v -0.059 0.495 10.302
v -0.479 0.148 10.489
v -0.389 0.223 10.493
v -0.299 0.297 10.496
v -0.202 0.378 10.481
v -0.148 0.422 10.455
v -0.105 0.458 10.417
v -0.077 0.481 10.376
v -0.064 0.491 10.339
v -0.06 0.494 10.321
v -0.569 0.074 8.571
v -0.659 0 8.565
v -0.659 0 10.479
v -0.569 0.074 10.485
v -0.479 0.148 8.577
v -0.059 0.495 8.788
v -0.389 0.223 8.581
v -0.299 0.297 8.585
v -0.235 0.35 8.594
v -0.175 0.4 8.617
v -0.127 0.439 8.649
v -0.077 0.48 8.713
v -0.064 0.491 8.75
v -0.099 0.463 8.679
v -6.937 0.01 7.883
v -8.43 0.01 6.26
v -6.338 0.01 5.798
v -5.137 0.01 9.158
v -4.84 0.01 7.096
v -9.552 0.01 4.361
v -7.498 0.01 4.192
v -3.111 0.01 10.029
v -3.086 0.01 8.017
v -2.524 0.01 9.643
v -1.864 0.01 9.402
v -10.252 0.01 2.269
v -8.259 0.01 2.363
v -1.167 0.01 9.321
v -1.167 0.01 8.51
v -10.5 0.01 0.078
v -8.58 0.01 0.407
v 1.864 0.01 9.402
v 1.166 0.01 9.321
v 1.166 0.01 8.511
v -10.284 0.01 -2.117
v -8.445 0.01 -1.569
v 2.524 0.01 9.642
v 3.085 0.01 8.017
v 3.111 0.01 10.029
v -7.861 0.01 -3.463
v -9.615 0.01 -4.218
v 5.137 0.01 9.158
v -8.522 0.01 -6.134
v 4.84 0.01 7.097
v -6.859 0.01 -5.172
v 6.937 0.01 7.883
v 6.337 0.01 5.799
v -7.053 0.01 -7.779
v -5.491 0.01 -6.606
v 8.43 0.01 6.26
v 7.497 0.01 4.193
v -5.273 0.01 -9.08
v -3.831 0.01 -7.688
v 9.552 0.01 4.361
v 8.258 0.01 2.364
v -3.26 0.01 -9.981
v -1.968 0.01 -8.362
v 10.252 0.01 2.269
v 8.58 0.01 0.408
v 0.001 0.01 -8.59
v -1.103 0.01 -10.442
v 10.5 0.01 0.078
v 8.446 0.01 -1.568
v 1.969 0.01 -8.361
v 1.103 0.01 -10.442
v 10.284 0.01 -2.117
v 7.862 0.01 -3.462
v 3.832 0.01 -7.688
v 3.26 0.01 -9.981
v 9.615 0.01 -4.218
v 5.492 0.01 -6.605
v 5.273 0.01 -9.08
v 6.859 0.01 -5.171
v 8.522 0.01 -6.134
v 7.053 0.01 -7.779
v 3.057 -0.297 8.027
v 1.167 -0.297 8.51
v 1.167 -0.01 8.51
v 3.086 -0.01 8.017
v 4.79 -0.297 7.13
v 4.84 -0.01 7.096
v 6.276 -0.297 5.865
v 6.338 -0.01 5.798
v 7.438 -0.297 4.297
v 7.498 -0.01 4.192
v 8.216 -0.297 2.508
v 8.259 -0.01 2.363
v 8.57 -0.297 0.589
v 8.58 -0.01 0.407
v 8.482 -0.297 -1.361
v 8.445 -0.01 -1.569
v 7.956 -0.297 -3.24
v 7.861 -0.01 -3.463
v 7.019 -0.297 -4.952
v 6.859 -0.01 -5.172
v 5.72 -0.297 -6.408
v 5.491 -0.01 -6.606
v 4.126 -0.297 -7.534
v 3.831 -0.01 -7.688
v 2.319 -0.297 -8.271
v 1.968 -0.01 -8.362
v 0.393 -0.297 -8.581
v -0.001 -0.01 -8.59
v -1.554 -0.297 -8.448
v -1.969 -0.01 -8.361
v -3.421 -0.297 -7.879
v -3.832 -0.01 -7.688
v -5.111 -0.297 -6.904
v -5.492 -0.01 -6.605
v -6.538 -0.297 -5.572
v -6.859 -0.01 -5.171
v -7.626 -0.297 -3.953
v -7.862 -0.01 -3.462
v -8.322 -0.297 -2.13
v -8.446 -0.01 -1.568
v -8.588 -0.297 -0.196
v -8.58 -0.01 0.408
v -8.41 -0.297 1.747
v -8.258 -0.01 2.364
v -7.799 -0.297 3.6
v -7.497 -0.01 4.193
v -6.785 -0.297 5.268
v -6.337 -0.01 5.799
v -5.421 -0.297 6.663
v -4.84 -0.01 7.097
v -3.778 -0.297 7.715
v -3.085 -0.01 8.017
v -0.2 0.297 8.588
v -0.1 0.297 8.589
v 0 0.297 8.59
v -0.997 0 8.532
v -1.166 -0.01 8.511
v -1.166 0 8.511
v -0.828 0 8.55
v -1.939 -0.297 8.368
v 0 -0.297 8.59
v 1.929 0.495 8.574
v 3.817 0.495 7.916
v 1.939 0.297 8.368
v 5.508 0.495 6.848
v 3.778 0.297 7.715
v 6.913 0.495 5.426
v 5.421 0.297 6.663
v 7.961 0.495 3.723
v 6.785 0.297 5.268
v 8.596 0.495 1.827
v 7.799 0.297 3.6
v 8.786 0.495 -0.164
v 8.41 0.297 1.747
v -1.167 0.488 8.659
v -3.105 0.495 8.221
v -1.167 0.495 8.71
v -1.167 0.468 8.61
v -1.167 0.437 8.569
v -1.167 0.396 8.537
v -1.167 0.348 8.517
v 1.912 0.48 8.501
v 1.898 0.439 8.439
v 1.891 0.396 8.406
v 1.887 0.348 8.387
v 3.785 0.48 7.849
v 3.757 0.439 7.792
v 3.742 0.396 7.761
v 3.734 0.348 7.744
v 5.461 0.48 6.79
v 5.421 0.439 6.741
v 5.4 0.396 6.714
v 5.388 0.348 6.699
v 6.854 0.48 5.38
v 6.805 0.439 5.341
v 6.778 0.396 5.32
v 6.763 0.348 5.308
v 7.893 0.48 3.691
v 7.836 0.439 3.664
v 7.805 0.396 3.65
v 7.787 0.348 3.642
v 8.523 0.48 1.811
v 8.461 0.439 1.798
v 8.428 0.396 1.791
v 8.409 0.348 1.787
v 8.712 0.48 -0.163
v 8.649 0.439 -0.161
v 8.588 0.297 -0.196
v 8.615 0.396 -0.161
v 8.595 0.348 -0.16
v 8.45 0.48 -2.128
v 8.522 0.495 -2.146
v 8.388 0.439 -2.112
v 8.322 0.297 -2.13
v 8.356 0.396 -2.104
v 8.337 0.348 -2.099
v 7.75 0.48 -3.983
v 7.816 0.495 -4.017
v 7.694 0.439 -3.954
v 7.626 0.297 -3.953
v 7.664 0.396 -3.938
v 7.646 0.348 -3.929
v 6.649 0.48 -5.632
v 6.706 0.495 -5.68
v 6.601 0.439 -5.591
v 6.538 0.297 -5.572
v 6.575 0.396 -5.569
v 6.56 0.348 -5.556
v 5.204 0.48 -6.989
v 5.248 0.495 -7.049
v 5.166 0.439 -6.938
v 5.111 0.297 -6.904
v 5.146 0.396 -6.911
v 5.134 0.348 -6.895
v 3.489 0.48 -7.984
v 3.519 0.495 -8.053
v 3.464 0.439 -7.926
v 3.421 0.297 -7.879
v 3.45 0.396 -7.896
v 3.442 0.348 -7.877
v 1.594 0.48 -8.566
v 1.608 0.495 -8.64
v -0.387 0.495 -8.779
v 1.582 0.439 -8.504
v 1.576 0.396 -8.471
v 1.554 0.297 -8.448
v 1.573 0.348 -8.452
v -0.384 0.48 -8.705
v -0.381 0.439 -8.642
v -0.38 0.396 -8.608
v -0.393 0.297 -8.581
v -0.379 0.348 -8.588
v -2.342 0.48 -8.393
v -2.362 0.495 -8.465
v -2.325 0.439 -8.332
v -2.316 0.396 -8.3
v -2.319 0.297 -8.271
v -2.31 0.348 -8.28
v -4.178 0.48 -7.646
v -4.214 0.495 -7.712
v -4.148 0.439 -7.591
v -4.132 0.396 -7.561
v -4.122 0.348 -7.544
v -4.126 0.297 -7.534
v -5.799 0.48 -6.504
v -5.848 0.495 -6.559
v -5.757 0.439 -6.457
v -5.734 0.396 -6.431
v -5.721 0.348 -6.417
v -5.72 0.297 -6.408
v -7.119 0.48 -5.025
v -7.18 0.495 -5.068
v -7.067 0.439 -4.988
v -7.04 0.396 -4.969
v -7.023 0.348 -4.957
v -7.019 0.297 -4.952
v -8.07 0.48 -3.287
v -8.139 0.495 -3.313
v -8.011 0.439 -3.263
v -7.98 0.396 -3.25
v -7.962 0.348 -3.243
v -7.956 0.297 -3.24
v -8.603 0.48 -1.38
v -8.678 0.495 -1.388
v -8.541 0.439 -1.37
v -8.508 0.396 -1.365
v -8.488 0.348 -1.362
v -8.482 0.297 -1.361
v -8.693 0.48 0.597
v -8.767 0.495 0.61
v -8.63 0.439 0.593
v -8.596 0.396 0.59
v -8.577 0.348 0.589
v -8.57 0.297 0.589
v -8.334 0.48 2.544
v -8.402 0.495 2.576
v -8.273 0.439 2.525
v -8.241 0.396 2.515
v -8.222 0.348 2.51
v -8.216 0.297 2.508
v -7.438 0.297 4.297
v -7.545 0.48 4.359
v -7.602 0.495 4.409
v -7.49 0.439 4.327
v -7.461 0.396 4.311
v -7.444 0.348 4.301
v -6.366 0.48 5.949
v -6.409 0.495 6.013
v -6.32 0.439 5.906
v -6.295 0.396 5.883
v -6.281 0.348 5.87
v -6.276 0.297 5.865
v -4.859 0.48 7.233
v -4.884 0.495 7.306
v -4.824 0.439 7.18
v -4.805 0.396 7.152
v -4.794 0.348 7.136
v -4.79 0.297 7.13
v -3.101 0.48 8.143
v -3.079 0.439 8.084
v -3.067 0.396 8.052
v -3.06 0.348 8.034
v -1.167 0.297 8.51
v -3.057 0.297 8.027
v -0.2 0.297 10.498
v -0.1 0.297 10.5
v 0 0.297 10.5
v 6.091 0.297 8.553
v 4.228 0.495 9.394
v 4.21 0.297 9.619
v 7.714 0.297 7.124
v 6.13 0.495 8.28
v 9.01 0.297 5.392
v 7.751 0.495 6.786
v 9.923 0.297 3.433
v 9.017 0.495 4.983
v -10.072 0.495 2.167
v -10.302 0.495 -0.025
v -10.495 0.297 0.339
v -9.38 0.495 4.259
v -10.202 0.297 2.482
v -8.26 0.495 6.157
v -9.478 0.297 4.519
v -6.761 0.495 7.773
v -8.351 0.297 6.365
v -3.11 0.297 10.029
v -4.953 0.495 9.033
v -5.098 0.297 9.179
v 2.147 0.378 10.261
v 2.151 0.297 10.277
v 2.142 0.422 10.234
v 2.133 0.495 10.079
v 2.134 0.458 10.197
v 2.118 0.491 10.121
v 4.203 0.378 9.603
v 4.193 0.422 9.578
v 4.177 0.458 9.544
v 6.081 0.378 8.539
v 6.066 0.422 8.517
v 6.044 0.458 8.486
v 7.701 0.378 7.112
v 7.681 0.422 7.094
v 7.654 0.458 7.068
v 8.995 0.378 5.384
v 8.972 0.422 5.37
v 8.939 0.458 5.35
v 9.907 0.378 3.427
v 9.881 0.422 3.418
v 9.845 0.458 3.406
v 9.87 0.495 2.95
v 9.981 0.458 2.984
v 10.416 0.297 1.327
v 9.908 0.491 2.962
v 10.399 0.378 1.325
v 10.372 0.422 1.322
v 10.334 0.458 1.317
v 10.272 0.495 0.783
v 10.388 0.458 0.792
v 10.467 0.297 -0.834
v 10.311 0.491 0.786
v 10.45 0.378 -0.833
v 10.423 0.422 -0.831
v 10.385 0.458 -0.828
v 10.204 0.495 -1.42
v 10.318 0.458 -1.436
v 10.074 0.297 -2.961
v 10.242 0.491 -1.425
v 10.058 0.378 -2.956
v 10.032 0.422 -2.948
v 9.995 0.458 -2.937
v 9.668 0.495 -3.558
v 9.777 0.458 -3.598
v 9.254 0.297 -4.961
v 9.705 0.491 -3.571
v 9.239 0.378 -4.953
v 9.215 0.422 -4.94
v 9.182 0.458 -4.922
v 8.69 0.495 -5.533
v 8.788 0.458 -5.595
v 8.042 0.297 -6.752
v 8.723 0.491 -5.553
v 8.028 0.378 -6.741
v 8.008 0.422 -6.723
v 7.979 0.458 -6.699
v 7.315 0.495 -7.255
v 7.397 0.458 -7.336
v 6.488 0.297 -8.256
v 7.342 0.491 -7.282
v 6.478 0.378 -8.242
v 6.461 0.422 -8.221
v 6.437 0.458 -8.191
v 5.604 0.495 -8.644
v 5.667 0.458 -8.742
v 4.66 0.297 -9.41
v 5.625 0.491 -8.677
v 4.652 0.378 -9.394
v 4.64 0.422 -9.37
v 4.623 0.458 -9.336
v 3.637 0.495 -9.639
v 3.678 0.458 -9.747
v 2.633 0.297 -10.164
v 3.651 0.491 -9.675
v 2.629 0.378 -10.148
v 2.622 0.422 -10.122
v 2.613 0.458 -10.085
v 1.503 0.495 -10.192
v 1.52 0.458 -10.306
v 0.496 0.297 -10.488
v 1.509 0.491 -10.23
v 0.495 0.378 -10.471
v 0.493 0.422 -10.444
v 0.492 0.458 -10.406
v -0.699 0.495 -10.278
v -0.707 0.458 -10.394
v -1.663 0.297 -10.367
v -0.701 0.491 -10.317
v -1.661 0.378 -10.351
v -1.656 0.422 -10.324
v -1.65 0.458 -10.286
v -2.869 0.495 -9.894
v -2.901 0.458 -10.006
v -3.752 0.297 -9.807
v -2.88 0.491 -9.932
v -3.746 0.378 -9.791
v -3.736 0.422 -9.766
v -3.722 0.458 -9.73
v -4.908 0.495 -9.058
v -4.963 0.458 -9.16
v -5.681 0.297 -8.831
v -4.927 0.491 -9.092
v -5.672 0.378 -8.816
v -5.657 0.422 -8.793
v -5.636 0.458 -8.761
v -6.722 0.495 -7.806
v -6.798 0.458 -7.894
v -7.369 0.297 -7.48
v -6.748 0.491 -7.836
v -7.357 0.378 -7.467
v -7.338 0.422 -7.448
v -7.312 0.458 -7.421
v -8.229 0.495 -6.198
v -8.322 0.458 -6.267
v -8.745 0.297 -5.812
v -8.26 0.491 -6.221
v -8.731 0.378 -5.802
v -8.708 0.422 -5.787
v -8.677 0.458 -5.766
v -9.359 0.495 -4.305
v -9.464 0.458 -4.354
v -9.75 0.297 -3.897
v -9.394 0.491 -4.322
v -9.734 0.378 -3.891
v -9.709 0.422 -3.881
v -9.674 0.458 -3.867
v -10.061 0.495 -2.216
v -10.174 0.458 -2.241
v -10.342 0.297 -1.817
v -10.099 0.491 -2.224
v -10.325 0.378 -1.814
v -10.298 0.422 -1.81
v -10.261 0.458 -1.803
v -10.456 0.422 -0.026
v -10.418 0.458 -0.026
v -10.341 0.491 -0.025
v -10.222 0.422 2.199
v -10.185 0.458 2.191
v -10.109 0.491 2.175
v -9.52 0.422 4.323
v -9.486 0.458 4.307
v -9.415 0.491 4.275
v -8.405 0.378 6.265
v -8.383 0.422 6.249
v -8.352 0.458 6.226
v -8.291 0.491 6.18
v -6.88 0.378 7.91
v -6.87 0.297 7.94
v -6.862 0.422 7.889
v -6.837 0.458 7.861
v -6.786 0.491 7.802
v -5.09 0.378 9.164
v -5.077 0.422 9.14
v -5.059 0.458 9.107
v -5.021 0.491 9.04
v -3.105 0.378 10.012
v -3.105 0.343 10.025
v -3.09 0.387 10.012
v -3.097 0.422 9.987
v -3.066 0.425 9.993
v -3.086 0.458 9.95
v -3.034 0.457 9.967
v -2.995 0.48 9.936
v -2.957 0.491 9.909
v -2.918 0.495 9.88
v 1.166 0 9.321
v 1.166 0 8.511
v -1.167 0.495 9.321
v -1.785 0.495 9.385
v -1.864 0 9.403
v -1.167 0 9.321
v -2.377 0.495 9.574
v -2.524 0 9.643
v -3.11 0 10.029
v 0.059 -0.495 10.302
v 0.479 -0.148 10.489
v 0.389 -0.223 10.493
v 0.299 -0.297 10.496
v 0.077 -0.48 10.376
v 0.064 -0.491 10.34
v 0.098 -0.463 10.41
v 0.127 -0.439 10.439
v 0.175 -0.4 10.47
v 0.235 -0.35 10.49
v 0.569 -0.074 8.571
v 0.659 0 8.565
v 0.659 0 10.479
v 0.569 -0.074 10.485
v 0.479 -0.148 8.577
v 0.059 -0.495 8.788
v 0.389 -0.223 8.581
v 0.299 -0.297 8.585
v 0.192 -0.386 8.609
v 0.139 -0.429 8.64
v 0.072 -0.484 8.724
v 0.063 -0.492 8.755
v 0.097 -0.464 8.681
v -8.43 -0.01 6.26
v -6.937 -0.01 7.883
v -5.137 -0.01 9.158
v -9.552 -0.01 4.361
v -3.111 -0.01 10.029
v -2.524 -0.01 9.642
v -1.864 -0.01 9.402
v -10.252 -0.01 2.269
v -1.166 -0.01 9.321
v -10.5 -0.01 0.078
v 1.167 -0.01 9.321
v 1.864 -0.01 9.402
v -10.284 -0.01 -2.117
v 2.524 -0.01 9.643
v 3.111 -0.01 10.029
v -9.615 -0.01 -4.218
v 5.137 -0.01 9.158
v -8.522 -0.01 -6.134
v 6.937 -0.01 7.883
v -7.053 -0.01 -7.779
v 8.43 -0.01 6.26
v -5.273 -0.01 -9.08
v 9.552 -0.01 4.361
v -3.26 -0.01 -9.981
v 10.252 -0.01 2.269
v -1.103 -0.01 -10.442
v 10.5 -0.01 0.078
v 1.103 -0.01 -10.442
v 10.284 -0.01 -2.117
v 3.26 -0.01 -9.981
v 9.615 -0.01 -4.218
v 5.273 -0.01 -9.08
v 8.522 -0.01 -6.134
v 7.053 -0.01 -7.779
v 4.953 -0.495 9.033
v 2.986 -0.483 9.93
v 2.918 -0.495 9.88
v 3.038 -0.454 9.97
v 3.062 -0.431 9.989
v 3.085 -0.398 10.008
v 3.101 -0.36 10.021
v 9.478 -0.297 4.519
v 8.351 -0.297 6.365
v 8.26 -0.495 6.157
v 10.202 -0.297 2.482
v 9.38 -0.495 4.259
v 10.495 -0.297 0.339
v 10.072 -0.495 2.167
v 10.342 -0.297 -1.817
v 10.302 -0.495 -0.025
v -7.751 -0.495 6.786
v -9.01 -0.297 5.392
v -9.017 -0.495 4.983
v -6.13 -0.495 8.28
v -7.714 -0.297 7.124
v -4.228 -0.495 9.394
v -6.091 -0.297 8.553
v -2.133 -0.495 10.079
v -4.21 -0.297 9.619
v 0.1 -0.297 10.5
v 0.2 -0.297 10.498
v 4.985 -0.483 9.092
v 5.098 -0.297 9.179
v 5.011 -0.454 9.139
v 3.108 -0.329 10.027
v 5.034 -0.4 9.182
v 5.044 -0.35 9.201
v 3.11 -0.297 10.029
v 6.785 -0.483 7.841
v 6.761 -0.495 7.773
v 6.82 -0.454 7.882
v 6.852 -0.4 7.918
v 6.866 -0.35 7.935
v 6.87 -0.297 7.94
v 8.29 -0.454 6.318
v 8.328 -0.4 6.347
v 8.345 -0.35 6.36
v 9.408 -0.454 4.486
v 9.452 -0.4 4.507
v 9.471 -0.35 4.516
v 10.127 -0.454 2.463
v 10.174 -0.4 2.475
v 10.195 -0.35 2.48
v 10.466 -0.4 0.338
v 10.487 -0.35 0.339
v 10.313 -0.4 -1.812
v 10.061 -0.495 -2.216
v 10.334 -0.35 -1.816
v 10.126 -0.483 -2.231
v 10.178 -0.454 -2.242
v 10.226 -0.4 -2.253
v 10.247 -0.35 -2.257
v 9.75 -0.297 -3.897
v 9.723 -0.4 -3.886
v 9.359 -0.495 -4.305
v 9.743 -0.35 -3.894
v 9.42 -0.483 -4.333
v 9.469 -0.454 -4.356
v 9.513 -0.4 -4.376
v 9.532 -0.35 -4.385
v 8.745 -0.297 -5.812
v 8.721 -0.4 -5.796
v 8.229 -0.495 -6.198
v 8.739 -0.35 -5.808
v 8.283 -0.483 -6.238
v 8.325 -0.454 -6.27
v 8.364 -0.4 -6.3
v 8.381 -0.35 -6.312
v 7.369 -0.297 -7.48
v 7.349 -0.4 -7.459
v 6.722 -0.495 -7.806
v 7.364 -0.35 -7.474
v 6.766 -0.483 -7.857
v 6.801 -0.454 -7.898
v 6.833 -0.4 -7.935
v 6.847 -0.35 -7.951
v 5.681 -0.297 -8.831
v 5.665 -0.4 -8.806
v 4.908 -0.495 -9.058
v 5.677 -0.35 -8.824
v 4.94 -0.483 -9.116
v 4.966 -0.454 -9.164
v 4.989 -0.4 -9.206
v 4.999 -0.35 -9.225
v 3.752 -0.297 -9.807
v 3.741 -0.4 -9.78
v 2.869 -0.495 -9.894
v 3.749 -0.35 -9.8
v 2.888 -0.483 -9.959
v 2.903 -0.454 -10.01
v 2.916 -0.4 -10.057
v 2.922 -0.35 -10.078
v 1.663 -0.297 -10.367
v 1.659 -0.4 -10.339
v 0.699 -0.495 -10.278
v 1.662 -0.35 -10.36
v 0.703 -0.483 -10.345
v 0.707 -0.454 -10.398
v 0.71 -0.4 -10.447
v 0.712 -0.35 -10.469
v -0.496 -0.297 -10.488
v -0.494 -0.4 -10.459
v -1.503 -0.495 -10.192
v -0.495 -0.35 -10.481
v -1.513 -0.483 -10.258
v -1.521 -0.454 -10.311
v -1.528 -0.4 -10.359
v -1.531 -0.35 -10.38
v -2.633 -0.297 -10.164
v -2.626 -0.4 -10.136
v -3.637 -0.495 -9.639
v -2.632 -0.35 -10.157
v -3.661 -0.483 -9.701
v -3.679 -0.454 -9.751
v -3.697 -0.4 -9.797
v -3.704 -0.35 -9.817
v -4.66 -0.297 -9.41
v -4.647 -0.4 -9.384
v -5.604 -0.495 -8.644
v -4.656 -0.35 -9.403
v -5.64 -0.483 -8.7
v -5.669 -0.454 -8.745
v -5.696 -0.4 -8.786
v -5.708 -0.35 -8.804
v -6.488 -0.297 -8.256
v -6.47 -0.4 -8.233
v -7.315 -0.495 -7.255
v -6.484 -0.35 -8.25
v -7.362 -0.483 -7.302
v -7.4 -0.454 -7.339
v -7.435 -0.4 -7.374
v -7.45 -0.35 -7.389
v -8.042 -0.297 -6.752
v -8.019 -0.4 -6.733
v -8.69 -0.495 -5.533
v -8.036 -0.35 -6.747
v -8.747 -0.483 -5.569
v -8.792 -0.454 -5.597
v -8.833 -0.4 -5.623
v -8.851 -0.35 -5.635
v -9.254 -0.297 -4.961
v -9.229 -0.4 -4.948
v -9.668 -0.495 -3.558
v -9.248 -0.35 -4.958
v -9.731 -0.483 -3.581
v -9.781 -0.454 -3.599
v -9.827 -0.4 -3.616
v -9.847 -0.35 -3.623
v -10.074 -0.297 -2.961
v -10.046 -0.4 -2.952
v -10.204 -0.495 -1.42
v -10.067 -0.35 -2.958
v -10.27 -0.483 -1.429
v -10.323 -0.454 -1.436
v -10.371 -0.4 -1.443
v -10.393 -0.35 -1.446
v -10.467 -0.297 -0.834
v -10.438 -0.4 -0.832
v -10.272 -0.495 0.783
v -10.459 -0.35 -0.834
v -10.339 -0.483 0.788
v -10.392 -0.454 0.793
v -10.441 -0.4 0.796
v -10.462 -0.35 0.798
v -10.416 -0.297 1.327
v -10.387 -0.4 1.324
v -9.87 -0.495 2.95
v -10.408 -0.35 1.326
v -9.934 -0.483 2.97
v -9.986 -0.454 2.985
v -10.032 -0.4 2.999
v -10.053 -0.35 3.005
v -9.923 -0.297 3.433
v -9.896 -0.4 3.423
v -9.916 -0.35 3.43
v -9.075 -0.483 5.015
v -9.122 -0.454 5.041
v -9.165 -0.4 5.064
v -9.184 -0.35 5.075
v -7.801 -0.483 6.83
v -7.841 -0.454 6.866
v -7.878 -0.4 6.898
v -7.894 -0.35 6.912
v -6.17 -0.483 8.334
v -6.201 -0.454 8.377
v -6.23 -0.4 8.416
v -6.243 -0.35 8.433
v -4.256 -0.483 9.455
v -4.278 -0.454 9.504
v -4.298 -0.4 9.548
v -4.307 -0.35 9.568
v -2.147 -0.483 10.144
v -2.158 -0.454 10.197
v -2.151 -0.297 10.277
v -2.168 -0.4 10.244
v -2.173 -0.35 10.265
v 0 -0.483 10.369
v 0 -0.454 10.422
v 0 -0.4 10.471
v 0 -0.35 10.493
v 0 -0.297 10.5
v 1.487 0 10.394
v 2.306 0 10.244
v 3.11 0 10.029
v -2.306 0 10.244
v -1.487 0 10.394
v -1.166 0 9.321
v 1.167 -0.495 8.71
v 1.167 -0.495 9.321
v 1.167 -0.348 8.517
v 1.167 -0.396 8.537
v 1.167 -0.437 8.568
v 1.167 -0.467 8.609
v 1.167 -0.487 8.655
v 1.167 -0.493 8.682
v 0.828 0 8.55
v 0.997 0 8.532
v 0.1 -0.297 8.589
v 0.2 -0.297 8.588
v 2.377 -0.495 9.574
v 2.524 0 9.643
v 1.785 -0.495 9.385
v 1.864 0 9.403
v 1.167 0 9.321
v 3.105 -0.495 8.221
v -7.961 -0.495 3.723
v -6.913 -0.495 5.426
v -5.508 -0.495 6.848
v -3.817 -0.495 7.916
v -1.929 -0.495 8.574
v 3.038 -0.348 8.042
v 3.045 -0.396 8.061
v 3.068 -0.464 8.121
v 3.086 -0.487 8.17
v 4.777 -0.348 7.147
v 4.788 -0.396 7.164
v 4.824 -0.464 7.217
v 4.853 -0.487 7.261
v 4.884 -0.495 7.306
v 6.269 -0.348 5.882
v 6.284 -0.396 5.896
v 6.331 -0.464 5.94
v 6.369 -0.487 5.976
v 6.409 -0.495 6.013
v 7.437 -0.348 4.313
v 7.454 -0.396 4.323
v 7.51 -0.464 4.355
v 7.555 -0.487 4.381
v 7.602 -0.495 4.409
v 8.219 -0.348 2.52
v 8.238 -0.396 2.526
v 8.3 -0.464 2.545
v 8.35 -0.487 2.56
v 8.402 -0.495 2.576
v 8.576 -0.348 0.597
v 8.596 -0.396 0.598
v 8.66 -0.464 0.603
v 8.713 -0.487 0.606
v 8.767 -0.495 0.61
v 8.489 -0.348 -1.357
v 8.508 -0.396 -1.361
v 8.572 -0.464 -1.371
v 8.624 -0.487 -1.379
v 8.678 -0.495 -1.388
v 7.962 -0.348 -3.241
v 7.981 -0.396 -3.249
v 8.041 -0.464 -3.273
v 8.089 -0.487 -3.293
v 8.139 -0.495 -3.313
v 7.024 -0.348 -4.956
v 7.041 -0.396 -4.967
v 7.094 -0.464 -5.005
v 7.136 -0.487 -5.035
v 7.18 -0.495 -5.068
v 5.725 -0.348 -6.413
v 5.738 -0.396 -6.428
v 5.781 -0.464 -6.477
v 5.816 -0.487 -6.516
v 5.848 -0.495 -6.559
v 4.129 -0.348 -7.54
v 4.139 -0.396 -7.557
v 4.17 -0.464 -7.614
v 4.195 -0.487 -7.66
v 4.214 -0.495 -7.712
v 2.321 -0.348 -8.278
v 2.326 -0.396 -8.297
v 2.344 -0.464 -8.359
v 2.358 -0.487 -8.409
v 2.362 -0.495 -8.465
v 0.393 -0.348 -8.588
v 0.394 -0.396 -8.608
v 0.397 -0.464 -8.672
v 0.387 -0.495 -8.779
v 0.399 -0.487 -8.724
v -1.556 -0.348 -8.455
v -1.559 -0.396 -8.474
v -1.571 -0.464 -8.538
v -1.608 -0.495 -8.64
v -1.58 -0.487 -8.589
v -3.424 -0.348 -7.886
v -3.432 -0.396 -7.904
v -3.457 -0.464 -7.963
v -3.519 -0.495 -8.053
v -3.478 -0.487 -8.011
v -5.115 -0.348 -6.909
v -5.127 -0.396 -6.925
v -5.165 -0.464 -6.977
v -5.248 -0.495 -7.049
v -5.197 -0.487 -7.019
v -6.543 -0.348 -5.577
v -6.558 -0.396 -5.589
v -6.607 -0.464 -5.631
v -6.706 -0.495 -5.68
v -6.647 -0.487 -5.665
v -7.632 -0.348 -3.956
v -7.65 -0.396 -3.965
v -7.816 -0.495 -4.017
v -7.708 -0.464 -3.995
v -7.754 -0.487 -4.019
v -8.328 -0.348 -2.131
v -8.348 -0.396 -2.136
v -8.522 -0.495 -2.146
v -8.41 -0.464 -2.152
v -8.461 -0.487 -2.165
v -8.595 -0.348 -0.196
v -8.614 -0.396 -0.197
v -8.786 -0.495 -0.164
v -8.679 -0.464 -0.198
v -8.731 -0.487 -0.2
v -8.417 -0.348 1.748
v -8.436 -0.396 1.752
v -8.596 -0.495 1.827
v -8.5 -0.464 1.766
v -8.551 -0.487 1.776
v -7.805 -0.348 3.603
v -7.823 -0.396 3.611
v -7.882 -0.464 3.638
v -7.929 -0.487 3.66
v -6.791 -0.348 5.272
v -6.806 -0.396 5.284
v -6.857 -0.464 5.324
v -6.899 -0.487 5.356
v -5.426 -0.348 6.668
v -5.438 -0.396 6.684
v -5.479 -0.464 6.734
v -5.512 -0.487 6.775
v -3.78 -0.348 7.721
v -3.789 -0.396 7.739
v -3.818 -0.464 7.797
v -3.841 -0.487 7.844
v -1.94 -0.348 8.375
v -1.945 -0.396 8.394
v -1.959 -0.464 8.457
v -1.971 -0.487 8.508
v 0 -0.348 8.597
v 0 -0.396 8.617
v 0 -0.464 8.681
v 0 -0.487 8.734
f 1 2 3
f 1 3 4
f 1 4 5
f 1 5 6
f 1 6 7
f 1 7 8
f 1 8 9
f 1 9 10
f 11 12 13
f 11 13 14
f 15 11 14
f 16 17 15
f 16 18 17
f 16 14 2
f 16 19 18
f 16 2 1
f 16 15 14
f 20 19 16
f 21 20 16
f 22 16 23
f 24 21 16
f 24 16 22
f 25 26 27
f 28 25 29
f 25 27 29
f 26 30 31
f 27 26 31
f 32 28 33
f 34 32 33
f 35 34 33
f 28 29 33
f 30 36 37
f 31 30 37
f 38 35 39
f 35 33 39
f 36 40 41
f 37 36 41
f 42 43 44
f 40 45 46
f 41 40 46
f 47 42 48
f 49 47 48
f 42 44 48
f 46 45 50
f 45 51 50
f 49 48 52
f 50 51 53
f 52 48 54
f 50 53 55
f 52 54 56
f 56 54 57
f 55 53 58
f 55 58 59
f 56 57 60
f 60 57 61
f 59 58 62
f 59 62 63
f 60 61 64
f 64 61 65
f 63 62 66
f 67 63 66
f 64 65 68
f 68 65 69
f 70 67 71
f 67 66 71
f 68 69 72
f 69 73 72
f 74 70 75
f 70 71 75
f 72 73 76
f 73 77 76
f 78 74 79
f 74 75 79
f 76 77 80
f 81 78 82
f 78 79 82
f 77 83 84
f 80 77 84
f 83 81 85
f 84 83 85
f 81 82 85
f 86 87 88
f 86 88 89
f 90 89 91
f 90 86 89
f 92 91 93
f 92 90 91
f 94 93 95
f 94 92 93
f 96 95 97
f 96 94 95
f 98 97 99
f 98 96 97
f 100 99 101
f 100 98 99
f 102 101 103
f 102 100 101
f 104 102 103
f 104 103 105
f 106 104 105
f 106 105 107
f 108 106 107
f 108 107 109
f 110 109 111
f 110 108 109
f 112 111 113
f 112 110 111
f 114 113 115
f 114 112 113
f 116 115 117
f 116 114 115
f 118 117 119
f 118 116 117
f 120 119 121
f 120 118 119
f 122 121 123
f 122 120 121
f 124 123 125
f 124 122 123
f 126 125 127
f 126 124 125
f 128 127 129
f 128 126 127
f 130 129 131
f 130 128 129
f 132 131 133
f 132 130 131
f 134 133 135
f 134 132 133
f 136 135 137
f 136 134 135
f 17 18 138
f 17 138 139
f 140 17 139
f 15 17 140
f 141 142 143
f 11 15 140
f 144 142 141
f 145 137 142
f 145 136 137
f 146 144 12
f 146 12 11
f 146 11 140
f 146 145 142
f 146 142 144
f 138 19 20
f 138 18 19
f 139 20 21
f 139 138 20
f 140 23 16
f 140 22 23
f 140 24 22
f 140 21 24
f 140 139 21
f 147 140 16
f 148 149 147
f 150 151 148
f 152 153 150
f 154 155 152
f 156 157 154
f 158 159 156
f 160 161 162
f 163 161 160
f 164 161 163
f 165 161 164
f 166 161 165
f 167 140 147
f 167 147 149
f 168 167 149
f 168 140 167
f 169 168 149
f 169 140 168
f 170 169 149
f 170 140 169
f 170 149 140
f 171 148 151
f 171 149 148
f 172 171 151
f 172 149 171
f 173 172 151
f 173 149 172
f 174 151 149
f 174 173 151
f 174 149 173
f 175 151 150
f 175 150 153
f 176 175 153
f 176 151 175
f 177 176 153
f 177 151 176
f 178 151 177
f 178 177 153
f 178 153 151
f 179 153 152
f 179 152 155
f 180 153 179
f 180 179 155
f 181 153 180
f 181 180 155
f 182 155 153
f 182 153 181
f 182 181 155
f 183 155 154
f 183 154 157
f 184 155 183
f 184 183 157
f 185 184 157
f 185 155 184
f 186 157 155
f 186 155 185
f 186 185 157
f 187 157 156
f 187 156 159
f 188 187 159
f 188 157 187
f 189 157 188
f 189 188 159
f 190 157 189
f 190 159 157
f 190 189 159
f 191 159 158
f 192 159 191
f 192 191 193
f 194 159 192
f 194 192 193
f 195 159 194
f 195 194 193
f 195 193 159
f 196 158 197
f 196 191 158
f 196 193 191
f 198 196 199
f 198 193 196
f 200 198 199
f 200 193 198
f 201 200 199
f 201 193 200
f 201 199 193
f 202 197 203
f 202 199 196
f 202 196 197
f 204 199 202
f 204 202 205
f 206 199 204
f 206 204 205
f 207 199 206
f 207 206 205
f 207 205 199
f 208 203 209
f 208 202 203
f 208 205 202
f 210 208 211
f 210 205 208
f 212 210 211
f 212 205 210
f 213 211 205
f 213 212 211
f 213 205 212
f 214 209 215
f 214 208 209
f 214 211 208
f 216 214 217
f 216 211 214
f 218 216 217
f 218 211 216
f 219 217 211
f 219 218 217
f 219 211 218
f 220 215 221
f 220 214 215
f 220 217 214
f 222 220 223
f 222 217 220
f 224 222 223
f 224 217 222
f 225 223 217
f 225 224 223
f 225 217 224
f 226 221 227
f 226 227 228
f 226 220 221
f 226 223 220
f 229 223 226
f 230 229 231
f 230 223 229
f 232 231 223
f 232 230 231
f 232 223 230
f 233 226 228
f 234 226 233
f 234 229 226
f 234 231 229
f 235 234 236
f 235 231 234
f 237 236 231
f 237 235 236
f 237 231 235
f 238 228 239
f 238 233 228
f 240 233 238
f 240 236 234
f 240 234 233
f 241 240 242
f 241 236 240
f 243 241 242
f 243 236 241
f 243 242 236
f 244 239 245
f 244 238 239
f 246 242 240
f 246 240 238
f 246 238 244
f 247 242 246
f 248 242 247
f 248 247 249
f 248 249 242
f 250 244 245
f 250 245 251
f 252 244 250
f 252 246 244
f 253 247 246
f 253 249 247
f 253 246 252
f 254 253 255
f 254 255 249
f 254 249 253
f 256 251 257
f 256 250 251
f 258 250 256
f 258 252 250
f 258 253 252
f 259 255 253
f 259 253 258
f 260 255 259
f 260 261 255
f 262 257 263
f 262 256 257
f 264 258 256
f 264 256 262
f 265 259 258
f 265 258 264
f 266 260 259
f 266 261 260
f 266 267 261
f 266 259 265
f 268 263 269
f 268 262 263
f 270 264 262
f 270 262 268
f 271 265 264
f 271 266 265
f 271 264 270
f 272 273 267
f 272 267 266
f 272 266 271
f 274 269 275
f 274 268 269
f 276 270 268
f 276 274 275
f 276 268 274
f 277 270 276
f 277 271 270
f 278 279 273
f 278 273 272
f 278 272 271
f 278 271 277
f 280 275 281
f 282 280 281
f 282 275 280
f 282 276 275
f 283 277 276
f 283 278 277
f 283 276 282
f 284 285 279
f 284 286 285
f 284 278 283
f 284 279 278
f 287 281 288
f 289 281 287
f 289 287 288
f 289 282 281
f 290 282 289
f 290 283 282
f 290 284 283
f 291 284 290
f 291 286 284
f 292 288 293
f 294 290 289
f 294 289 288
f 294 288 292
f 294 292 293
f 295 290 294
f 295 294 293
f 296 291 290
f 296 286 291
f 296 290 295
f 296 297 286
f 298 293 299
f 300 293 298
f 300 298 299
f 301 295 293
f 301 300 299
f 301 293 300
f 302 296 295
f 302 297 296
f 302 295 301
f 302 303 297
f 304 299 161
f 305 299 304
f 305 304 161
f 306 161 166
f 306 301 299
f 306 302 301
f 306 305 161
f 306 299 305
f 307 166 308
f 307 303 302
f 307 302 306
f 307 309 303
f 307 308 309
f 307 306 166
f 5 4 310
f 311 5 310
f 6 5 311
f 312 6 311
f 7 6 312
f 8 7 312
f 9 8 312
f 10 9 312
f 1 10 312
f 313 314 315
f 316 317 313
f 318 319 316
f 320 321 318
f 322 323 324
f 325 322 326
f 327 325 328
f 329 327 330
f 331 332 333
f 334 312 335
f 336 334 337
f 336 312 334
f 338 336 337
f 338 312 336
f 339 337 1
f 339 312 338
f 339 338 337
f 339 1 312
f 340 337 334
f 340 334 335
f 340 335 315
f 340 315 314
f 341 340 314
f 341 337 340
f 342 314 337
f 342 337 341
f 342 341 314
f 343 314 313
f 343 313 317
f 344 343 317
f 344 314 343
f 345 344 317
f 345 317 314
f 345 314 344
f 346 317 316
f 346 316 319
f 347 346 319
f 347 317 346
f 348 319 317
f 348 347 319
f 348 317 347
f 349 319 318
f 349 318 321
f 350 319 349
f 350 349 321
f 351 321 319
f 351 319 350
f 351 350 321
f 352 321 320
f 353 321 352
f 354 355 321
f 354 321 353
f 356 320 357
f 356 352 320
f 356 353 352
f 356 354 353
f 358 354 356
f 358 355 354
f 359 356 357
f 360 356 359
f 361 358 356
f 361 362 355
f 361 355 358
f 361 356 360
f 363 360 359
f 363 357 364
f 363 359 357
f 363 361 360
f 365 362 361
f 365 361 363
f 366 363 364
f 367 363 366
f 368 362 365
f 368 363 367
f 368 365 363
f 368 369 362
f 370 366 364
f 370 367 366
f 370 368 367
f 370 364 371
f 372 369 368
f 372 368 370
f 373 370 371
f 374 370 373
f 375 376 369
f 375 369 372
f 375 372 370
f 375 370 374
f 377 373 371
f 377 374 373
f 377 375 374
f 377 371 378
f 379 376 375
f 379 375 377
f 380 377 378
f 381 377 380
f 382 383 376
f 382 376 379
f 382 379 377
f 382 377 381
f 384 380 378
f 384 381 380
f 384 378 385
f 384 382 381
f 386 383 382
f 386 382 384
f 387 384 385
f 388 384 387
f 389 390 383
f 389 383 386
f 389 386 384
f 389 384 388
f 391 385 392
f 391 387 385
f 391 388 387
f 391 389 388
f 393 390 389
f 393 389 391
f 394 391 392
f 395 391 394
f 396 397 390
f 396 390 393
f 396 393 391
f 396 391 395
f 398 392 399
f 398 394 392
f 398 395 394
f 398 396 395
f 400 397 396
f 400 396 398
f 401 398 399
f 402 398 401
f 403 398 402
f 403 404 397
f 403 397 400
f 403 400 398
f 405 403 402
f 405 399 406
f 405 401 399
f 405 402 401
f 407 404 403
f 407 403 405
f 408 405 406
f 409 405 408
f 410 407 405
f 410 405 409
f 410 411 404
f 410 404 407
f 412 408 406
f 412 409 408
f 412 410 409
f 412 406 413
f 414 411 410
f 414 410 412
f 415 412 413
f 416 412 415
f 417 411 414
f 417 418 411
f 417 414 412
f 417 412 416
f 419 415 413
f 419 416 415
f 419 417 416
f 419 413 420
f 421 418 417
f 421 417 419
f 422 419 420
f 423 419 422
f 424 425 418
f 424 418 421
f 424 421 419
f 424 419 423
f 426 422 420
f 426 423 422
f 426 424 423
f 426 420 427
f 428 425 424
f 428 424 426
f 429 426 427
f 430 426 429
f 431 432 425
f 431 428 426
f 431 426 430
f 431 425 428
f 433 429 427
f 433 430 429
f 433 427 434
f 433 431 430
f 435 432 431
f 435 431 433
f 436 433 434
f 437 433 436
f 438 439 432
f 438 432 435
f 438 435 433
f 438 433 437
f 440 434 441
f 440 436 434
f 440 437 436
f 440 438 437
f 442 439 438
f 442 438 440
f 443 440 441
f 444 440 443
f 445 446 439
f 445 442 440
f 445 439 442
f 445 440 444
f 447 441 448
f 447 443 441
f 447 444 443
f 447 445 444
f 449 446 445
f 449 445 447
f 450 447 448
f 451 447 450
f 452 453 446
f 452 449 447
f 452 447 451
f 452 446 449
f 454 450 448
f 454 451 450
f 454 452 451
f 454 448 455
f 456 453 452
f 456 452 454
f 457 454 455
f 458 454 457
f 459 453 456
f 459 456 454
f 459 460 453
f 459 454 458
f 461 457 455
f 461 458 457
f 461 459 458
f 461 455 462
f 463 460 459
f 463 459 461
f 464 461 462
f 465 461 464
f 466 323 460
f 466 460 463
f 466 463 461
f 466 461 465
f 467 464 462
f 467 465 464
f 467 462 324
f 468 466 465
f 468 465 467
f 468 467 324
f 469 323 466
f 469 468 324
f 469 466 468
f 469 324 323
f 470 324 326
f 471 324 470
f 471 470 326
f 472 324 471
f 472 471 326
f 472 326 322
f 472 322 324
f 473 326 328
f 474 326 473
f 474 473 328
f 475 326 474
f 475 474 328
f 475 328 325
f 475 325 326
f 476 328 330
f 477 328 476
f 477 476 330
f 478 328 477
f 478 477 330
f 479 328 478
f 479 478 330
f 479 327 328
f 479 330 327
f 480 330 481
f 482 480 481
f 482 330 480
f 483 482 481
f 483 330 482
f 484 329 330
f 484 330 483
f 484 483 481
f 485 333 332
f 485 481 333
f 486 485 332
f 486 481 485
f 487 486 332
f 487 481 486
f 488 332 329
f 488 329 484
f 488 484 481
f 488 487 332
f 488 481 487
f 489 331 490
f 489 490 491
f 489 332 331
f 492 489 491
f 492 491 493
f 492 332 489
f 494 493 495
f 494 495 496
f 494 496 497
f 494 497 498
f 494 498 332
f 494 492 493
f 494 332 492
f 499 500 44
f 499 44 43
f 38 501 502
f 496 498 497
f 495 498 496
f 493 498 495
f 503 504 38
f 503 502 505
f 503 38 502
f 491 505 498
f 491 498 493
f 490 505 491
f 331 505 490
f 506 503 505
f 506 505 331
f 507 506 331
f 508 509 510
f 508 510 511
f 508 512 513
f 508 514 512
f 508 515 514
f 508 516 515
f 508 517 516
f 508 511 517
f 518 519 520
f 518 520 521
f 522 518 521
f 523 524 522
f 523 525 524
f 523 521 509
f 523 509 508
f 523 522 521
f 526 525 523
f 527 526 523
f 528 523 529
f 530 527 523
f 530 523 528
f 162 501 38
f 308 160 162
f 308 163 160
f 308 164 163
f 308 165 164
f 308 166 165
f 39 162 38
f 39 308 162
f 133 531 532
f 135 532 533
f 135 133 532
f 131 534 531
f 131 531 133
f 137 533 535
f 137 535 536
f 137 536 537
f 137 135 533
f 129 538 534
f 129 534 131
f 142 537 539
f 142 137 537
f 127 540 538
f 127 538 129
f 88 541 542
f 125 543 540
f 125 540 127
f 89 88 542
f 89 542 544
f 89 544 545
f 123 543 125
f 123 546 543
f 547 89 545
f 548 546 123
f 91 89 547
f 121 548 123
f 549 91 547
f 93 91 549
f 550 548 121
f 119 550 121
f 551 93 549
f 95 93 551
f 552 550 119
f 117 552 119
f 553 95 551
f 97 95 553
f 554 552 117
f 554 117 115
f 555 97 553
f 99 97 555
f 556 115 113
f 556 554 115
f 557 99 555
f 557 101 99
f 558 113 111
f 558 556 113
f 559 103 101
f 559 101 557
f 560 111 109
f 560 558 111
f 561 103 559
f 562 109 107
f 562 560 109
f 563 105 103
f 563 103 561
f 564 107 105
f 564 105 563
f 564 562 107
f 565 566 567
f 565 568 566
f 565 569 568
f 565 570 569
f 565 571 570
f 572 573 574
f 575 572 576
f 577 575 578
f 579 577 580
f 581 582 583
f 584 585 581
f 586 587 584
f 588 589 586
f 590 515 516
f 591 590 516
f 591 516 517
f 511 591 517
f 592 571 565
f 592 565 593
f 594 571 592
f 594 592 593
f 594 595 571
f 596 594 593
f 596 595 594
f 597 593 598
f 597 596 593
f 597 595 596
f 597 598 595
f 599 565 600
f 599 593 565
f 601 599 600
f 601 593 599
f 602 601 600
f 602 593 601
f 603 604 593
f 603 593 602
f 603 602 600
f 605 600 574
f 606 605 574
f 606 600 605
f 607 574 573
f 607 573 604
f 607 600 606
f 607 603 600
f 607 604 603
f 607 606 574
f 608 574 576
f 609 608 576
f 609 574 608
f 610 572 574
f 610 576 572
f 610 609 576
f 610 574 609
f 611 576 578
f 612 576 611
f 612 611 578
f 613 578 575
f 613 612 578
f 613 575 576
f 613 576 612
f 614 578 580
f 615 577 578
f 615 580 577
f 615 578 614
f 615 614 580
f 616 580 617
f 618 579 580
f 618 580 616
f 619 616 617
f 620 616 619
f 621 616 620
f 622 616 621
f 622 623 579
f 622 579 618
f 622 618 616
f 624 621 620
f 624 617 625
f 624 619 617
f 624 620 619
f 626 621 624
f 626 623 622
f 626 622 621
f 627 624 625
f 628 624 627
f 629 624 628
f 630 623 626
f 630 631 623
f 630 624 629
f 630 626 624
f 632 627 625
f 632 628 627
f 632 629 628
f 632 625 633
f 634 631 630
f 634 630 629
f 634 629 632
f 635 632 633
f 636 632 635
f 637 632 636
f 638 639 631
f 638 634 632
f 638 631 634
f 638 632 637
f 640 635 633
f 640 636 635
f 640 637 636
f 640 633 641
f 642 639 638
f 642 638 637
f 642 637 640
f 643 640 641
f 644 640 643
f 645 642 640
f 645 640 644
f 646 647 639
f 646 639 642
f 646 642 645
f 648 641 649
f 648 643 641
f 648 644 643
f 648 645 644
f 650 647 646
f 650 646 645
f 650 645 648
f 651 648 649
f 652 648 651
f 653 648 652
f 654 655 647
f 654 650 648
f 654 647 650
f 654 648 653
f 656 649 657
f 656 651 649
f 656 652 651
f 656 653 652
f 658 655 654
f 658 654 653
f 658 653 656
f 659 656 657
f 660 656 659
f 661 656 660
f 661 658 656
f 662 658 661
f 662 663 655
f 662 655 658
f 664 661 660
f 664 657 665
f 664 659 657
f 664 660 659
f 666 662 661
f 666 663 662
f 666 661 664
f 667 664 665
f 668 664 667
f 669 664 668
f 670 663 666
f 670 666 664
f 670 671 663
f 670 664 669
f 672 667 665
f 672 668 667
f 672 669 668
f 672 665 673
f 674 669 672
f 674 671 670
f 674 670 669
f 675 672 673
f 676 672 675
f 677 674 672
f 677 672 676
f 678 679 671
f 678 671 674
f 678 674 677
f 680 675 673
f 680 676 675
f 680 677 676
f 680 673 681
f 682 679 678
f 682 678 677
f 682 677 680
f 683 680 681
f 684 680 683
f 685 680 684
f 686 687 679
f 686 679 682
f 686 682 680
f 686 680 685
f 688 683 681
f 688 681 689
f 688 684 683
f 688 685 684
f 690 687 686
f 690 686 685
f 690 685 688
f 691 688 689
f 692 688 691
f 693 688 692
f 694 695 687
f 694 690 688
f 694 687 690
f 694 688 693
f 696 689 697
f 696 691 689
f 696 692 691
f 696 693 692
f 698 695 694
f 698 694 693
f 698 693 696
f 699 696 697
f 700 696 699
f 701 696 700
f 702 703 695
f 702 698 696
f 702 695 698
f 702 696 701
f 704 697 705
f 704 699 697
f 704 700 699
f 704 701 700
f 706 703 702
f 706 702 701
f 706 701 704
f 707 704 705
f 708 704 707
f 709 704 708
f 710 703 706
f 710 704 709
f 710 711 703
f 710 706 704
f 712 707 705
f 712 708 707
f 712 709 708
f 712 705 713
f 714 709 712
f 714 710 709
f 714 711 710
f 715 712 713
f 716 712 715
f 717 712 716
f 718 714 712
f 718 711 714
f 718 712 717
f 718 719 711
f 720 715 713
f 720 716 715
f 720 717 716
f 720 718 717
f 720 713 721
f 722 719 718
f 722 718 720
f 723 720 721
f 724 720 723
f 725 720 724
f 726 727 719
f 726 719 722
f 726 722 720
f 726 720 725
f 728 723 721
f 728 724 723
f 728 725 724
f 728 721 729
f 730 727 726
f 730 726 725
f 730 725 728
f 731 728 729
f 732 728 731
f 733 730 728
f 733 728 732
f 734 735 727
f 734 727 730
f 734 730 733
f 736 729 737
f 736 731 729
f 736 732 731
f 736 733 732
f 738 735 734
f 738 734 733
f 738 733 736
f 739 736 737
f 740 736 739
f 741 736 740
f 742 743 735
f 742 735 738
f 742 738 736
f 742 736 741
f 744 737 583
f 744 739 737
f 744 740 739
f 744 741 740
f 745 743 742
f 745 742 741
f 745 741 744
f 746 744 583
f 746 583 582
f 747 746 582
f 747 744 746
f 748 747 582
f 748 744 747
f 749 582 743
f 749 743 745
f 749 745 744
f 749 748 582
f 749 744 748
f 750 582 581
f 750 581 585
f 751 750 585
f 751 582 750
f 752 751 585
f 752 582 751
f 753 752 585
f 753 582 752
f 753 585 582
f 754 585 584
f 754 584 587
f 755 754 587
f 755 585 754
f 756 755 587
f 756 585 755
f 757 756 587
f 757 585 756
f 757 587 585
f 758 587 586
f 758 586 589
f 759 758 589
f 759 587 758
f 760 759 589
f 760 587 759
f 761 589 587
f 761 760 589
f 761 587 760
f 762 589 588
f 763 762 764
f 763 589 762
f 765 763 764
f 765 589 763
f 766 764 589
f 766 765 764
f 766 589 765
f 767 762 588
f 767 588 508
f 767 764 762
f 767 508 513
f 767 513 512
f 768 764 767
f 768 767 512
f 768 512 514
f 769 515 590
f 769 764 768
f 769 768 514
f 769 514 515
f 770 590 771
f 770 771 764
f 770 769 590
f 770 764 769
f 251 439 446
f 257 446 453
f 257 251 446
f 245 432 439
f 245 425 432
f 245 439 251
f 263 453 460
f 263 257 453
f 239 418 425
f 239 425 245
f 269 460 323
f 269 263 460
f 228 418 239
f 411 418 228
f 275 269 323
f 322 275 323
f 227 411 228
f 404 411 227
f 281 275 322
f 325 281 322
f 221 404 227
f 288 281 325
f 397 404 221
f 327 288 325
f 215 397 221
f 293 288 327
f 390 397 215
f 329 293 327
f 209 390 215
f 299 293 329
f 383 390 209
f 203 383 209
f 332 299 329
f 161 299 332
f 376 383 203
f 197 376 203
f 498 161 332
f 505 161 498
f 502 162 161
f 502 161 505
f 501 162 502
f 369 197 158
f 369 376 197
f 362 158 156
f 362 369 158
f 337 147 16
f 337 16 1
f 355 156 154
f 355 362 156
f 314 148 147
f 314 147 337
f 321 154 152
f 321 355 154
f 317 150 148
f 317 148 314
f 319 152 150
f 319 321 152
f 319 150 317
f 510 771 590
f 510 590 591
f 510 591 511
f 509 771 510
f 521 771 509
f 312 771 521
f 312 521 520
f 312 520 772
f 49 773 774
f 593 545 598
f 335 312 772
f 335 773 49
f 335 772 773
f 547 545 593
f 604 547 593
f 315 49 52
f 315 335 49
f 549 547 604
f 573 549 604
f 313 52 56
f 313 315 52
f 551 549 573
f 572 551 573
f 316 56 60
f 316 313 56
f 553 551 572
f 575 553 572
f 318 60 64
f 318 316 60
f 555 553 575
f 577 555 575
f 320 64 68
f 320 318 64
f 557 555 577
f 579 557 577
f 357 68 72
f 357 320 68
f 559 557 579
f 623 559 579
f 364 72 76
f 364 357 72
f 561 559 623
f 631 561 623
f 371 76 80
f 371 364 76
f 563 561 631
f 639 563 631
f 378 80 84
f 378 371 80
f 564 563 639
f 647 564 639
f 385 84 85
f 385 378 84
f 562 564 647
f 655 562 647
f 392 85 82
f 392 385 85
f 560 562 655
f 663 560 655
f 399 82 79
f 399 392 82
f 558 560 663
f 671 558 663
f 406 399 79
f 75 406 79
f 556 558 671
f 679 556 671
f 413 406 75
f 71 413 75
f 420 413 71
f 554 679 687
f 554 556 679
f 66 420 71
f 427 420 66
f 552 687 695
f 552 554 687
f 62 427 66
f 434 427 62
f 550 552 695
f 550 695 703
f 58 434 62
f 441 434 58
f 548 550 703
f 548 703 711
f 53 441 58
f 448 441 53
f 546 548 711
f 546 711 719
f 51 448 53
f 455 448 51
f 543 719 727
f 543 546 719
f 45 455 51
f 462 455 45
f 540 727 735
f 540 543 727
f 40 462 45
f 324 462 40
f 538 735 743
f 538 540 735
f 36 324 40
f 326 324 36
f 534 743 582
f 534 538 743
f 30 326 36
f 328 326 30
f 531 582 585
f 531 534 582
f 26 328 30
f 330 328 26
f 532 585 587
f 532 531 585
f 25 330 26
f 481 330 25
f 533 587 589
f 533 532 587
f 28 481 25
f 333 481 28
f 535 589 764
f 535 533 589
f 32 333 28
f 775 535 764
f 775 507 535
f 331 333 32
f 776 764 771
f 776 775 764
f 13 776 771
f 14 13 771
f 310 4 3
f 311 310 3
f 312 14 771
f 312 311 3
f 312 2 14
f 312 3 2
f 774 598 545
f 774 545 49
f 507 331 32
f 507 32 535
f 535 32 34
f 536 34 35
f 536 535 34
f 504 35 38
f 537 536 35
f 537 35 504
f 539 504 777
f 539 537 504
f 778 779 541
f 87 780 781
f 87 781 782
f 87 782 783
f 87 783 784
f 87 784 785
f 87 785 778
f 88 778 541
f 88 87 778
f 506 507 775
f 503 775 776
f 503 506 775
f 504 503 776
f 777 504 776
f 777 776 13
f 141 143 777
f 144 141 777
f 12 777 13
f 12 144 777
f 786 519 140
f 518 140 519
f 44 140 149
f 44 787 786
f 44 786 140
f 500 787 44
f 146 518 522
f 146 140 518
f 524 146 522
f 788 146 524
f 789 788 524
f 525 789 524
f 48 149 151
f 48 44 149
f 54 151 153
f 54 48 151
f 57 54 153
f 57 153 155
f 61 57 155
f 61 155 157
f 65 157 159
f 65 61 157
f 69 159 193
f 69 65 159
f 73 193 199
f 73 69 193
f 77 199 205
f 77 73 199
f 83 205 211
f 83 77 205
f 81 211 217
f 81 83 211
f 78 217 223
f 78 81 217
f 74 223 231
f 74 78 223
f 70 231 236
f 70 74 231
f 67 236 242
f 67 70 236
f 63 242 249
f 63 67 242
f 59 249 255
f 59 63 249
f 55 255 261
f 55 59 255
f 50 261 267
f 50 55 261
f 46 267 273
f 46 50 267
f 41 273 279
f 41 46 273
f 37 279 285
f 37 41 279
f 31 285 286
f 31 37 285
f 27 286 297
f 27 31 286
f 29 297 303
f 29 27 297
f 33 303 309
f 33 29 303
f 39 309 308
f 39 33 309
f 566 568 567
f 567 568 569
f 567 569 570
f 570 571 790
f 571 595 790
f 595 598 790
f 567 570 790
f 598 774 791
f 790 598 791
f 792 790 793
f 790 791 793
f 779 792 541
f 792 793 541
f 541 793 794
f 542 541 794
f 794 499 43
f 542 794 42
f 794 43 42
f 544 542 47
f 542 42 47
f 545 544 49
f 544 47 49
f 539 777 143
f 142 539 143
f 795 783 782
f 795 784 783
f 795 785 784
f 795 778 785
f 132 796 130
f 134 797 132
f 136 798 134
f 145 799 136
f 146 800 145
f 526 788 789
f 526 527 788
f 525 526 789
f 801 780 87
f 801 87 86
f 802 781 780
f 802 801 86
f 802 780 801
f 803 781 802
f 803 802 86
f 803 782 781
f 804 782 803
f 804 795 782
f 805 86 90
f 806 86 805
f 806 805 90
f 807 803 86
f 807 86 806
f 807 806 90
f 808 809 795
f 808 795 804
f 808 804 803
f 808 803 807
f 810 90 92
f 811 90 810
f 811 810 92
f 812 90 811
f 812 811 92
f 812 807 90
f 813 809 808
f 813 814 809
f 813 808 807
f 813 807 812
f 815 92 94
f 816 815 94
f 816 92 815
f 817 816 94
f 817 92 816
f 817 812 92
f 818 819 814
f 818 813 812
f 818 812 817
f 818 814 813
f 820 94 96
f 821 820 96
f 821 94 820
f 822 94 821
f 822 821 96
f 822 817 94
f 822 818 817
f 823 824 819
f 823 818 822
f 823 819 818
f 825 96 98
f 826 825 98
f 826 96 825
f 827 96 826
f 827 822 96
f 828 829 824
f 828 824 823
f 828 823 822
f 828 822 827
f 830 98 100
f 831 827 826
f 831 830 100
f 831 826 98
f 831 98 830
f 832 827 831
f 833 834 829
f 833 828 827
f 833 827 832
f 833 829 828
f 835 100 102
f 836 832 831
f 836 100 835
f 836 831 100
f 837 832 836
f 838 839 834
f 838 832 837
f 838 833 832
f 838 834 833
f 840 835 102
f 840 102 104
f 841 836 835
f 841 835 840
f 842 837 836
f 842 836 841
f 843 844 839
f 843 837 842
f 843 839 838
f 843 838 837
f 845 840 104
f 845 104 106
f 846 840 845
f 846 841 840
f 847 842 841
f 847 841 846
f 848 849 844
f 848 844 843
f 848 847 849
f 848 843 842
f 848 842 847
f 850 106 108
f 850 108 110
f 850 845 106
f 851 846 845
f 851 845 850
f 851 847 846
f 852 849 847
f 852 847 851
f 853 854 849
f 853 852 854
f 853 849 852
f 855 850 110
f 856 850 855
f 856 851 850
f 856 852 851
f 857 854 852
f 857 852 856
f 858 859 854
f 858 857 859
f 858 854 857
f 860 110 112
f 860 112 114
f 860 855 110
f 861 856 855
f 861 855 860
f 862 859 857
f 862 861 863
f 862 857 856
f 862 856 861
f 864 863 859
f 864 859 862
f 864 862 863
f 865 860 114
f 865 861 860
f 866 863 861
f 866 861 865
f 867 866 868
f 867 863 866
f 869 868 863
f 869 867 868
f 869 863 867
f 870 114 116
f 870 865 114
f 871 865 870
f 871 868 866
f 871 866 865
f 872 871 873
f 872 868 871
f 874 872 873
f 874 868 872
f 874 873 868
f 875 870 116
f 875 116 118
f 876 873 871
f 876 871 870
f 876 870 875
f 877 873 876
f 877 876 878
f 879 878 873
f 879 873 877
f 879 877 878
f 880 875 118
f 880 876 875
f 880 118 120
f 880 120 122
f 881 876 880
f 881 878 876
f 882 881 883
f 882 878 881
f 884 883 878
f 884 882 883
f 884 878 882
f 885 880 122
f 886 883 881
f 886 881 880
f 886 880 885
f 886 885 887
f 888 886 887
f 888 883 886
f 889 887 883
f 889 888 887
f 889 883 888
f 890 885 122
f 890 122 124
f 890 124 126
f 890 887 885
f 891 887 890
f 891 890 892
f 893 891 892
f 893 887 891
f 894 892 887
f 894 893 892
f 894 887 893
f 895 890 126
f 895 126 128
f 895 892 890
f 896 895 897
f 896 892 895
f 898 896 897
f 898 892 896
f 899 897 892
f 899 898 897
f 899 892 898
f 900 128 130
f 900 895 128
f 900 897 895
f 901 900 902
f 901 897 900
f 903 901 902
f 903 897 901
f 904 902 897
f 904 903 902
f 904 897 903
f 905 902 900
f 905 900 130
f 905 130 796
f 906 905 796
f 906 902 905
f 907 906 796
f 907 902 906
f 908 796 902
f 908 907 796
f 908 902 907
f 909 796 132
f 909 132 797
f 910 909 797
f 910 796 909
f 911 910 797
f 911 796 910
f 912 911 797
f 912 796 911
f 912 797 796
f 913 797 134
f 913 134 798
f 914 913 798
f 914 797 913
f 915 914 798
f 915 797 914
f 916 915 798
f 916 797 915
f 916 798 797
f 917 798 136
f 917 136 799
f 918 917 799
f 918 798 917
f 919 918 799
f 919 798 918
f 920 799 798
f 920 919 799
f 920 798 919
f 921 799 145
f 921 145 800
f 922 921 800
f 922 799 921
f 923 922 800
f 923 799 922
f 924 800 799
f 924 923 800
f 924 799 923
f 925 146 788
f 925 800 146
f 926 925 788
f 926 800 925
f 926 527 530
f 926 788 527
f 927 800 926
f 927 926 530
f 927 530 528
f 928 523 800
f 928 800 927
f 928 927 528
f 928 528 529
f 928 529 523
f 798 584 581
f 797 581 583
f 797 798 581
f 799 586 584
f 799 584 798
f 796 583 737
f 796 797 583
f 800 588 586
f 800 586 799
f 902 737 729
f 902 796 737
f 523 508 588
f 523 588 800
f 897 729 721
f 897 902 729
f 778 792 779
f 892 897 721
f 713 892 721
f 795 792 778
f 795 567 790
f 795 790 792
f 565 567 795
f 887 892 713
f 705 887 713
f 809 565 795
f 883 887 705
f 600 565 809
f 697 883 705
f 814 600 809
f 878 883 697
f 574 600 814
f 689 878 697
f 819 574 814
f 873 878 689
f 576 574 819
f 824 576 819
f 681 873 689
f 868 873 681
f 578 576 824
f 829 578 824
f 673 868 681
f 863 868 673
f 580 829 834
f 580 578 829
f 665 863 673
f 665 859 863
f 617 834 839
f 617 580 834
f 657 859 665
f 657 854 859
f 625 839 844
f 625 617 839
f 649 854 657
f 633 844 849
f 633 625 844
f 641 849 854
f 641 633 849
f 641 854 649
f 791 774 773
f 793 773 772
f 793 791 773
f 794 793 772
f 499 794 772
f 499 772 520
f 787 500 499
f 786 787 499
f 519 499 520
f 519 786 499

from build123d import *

# Parameters (mm, degrees)
CUT_EXTRUDE1_DEPTH      = 21
CUT_EXTRUDE2_DEPTH      = 21
CUT_EXTRUDE3_DEPTH      = 21
CUT_EXTRUDE4_DEPTH      = 21
CUT_EXTRUDE5_DEPTH      = 0.01
CUT_EXTRUDE5_DEPTH_BACK = 0.01


with BuildPart() as part:
    # Sketch1 → Revolve1 (revolve)
    with BuildSketch(Plane(origin=(0, 0, 0), x_dir=(0, 0, -1), z_dir=(1, 0, 0)), mode=Mode.PRIVATE) as revolve1_sk:
        with BuildLine():
            Line((8.788, -0.495), (10.302, -0.495))
            ThreePointArc((10.302, -0.495), (10.442007143, -0.437007143), (10.5, -0.297))
            Line((10.5, -0.297), (10.5, 0.297))
            ThreePointArc((10.5, 0.297), (10.442007143, 0.437007143), (10.302, 0.495))
            Line((10.302, 0.495), (8.788, 0.495))
            ThreePointArc((8.788, 0.495), (8.647992857, 0.437007143), (8.59, 0.297))
            Line((8.59, 0.297), (8.59, -0.297))
            ThreePointArc((8.59, -0.297), (8.647992857, -0.437007143), (8.788, -0.495))
        make_face()
    revolve(revolve1_sk.sketch.rotate(Axis((0, -1, 0), (0, 1, 0)), 180), axis=Axis((0, -1, 0), (0, 1, 0)))

    # Sketch2 → Cut-Extrude1 (cut)
    with BuildSketch(Plane(origin=(0, 0, 0), x_dir=(1, 0, 0), z_dir=(0, 1, 0))):
        with BuildLine():
            Line((-1.165666667, -15.369150396), (-1.165666667, -9.320817394))
            ThreePointArc((-1.165666667, -9.320817394), (-4.189833168, -12.344983895), (-1.165666667, -15.369150396))
        make_face()
    extrude(amount=CUT_EXTRUDE1_DEPTH, mode=Mode.SUBTRACT)

    # Sketch3 → Cut-Extrude2 (cut)
    with BuildSketch(Plane(origin=(0, 0, 0), x_dir=(1, 0, 0), z_dir=(0, 1, 0))):
        with BuildLine():
            Line((1.165666667, -9.320817394), (1.165666667, -15.369150396))
            ThreePointArc((1.165666667, -15.369150396), (4.189833168, -12.344983895), (1.165666667, -9.320817394))
        make_face()
    extrude(amount=-CUT_EXTRUDE2_DEPTH, mode=Mode.SUBTRACT)

    # Sketch4 → Cut-Extrude3 (cut)
    with BuildSketch(Plane.XY):
        Polygon((-1.166666667, 1.0885), (-1.166666667, 0), (-0.659393939, 0), (0.66, 1.0885), align=None)
    extrude(amount=CUT_EXTRUDE3_DEPTH, mode=Mode.SUBTRACT)

    # Sketch5 → Cut-Extrude4 (cut)
    with BuildSketch(Plane.XY):
        Polygon((-0.66, -1.0885), (1.166666667, -1.0885), (1.166666667, 0), (0.659393939, 0), align=None)
    extrude(amount=CUT_EXTRUDE4_DEPTH, mode=Mode.SUBTRACT)

    # Sketch6 → Cut-Extrude5 (cut, two sides)
    with BuildSketch(Plane(origin=(0, 0, 0), x_dir=(1, 0, 0), z_dir=(0, 1, 0))) as cut_extrude5_sk:
        with BuildLine():
            Line((-10.71, -10.71), (-3.710760158, -10.71))
            ThreePointArc((-3.710760158, -10.71), (-2.615558728, -9.690497914), (-1.165666667, -9.320817394))
            Line((-1.165666667, -9.320817394), (-1.165666667, -8.500448295))
            ThreePointArc((-1.165666667, -8.500448295), (0, -8.58), (1.165666667, -8.500448295))
            Line((1.165666667, -8.500448295), (1.165666667, -9.320817394))
            ThreePointArc((1.165666667, -9.320817394), (2.615558728, -9.690497914), (3.710760158, -10.71))
            Line((3.710760158, -10.71), (10.71, -10.71))
            Line((10.71, -10.71), (10.71, 10.71))
            Line((10.71, 10.71), (-10.71, 10.71))
            Line((-10.71, 10.71), (-10.71, -10.71))
        make_face()
    extrude(amount=CUT_EXTRUDE5_DEPTH, mode=Mode.SUBTRACT)
    extrude(cut_extrude5_sk.sketch, amount=-CUT_EXTRUDE5_DEPTH_BACK, mode=Mode.SUBTRACT)


solid = part.part
